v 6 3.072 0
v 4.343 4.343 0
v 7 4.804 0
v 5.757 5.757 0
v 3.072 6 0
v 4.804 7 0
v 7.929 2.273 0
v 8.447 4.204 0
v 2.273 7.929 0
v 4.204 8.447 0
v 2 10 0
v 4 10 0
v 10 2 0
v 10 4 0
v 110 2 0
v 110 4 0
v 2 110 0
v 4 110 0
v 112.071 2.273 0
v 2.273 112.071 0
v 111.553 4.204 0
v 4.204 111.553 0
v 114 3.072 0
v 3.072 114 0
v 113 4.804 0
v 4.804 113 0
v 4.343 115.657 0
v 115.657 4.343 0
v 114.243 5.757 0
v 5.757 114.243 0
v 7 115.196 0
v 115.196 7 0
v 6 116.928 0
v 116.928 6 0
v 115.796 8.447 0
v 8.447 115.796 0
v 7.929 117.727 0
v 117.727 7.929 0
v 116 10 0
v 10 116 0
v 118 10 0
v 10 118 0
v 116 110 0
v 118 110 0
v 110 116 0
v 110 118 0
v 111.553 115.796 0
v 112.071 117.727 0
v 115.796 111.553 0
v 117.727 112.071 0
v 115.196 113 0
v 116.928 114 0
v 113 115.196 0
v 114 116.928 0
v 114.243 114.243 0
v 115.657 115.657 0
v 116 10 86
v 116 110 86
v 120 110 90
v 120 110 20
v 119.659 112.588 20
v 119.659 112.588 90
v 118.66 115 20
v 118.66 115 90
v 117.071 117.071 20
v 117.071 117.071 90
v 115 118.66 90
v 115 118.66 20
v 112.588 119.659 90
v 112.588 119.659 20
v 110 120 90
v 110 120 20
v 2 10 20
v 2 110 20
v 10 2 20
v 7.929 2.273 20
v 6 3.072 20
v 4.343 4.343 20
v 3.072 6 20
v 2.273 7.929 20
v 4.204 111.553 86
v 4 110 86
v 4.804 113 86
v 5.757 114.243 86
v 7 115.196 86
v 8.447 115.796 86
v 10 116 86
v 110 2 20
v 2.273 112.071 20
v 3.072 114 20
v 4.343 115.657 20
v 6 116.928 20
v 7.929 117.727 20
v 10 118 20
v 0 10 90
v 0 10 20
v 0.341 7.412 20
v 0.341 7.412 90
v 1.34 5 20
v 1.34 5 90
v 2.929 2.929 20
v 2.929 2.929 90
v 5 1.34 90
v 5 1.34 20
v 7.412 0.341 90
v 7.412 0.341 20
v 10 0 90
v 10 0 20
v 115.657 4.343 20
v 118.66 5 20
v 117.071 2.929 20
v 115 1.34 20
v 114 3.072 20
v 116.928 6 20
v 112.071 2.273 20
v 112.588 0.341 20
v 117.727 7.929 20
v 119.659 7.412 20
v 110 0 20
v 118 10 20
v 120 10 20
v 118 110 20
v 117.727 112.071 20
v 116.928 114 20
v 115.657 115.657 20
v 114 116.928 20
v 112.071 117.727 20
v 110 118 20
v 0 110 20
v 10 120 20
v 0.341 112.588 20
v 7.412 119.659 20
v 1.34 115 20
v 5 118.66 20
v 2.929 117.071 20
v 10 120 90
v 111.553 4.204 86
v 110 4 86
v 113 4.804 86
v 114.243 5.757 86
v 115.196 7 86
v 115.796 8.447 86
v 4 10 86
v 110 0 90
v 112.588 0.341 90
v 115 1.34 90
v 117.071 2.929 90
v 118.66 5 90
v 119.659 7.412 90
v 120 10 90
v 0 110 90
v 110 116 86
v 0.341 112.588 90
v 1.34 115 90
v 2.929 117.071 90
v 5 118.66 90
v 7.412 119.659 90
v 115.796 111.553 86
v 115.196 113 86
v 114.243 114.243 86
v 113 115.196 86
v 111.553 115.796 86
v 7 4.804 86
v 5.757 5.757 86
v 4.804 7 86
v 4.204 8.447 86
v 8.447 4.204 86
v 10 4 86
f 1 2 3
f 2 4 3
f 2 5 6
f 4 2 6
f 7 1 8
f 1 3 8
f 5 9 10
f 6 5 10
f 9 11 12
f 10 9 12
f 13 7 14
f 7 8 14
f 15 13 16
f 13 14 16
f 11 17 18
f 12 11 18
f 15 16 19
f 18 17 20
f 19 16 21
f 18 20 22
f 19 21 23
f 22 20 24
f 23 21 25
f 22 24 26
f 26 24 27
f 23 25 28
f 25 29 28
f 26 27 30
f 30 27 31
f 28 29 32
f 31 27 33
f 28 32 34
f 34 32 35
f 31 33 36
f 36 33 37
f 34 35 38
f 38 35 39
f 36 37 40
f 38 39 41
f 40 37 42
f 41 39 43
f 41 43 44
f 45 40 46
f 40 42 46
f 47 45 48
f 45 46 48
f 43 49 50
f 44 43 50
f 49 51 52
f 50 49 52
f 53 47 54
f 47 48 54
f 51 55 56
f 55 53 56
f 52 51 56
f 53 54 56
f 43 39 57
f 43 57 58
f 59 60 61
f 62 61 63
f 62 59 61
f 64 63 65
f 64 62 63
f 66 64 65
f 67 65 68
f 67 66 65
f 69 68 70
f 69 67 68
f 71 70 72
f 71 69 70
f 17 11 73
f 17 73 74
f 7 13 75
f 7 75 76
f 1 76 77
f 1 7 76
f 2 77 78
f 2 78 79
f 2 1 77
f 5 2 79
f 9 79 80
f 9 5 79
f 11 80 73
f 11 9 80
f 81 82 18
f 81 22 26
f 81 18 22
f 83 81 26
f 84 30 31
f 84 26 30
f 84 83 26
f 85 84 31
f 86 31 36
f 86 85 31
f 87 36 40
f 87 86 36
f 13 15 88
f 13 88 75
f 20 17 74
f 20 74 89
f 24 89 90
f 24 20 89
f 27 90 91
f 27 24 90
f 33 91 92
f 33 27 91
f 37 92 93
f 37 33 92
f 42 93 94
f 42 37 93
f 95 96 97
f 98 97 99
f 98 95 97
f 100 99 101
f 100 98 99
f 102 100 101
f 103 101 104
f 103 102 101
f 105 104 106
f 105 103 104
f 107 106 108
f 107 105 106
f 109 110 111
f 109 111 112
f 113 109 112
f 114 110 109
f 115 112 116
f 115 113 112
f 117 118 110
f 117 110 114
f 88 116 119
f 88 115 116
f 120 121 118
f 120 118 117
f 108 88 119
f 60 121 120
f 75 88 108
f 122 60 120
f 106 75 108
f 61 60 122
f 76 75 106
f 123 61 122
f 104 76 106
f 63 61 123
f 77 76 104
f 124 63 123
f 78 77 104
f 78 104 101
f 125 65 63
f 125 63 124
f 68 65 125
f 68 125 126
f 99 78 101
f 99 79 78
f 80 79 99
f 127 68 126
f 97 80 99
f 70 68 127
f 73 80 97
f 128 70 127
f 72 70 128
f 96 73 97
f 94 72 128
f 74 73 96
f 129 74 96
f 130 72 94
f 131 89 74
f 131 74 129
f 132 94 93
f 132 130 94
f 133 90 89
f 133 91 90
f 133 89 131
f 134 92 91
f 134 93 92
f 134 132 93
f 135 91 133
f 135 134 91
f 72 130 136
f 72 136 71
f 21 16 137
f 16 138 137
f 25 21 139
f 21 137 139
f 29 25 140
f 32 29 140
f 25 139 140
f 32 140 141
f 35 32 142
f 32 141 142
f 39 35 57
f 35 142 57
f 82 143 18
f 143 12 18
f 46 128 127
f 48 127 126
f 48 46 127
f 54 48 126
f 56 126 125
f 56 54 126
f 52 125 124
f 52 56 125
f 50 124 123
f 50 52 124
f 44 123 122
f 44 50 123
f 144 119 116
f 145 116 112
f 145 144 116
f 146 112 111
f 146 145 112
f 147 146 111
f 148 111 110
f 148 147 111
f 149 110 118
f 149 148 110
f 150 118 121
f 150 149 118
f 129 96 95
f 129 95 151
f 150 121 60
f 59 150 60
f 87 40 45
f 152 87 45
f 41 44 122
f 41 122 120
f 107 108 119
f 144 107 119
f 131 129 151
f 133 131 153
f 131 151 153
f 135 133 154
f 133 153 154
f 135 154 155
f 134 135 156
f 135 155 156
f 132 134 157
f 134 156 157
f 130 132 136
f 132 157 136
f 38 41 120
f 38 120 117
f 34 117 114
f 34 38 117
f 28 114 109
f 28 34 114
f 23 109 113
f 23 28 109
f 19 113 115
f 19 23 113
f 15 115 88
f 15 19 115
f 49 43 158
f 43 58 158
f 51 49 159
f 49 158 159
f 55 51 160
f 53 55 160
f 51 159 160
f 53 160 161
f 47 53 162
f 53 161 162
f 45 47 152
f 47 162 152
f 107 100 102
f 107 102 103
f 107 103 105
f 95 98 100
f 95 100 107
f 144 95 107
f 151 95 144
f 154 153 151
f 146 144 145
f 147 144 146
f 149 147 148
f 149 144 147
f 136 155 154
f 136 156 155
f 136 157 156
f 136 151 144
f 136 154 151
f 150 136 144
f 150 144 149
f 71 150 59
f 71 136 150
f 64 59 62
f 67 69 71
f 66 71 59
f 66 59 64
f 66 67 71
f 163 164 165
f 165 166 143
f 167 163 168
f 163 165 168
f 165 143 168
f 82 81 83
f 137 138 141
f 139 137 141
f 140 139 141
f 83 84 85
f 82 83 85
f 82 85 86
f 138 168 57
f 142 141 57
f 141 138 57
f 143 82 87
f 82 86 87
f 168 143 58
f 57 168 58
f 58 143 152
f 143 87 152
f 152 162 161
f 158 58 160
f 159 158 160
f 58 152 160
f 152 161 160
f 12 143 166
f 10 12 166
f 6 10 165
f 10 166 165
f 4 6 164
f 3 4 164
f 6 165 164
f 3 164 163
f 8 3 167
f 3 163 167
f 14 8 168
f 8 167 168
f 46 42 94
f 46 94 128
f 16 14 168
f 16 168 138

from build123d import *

# Parameters (mm, degrees)
SKETCH1_W           = 120
SKETCH1_H           = 120
BOSS_EXTRUDE1_DEPTH = 90
FILLET2_R           = 10
SHELL1_T            = -4
CUT_EXTRUDE1_DEPTH  = 20


with BuildPart() as part:
    # Sketch1 → Boss-Extrude1 (new body)
    with BuildSketch(Plane.XY):
        with Locations((60, 60)):
            Rectangle(SKETCH1_W, SKETCH1_H)
    extrude(amount=BOSS_EXTRUDE1_DEPTH)

    # Fillet2
    fillet2_edges = [part.edges().sort_by_distance(p)[0] for p in [
        (0, 0, 45),
        (120, 0, 45),
        (120, 120, 45),
        (0, 120, 45),
    ]]
    fillet(fillet2_edges, radius=FILLET2_R)

    # Shell1
    shell1_openings = [part.faces().sort_by_distance(p)[0] for p in [
        (60, 60, 0),
    ]]
    offset(amount=SHELL1_T, openings=shell1_openings, kind=Kind.INTERSECTION)

    # Sketch2 → Cut-Extrude1 (cut)
    with BuildSketch(Plane(origin=(0, 0, 0), x_dir=(-1, 0, 0), z_dir=(0, 0, -1))):
        with BuildLine():
            Line((-10, 120), (-110, 120))
            ThreePointArc((-110, 120), (-117.071067812, 117.071067812), (-120, 110))
            Line((-120, 110), (-120, 10))
            ThreePointArc((-120, 10), (-117.071067812, 2.928932188), (-110, 0))
            Line((-110, 0), (-10, 0))
            ThreePointArc((-10, 0), (-2.928932188, 2.928932188), (0, 10))
            Line((0, 10), (0, 110))
            ThreePointArc((0, 110), (-2.928932188, 117.071067812), (-10, 120))
        make_face()
        with BuildLine():
            Line((-10, 118), (-110, 118))
            ThreePointArc((-110, 118), (-115.656854249, 115.656854249), (-118, 110))
            Line((-118, 110), (-118, 10))
            ThreePointArc((-118, 10), (-115.656854249, 4.343145751), (-110, 2))
            Line((-110, 2), (-10, 2))
            ThreePointArc((-10, 2), (-4.343145751, 4.343145751), (-2, 10))
            Line((-2, 10), (-2, 110))
            ThreePointArc((-2, 110), (-4.343145751, 115.656854249), (-10, 118))
        make_face(mode=Mode.SUBTRACT)
    extrude(amount=-CUT_EXTRUDE1_DEPTH, mode=Mode.SUBTRACT)


solid = part.part
